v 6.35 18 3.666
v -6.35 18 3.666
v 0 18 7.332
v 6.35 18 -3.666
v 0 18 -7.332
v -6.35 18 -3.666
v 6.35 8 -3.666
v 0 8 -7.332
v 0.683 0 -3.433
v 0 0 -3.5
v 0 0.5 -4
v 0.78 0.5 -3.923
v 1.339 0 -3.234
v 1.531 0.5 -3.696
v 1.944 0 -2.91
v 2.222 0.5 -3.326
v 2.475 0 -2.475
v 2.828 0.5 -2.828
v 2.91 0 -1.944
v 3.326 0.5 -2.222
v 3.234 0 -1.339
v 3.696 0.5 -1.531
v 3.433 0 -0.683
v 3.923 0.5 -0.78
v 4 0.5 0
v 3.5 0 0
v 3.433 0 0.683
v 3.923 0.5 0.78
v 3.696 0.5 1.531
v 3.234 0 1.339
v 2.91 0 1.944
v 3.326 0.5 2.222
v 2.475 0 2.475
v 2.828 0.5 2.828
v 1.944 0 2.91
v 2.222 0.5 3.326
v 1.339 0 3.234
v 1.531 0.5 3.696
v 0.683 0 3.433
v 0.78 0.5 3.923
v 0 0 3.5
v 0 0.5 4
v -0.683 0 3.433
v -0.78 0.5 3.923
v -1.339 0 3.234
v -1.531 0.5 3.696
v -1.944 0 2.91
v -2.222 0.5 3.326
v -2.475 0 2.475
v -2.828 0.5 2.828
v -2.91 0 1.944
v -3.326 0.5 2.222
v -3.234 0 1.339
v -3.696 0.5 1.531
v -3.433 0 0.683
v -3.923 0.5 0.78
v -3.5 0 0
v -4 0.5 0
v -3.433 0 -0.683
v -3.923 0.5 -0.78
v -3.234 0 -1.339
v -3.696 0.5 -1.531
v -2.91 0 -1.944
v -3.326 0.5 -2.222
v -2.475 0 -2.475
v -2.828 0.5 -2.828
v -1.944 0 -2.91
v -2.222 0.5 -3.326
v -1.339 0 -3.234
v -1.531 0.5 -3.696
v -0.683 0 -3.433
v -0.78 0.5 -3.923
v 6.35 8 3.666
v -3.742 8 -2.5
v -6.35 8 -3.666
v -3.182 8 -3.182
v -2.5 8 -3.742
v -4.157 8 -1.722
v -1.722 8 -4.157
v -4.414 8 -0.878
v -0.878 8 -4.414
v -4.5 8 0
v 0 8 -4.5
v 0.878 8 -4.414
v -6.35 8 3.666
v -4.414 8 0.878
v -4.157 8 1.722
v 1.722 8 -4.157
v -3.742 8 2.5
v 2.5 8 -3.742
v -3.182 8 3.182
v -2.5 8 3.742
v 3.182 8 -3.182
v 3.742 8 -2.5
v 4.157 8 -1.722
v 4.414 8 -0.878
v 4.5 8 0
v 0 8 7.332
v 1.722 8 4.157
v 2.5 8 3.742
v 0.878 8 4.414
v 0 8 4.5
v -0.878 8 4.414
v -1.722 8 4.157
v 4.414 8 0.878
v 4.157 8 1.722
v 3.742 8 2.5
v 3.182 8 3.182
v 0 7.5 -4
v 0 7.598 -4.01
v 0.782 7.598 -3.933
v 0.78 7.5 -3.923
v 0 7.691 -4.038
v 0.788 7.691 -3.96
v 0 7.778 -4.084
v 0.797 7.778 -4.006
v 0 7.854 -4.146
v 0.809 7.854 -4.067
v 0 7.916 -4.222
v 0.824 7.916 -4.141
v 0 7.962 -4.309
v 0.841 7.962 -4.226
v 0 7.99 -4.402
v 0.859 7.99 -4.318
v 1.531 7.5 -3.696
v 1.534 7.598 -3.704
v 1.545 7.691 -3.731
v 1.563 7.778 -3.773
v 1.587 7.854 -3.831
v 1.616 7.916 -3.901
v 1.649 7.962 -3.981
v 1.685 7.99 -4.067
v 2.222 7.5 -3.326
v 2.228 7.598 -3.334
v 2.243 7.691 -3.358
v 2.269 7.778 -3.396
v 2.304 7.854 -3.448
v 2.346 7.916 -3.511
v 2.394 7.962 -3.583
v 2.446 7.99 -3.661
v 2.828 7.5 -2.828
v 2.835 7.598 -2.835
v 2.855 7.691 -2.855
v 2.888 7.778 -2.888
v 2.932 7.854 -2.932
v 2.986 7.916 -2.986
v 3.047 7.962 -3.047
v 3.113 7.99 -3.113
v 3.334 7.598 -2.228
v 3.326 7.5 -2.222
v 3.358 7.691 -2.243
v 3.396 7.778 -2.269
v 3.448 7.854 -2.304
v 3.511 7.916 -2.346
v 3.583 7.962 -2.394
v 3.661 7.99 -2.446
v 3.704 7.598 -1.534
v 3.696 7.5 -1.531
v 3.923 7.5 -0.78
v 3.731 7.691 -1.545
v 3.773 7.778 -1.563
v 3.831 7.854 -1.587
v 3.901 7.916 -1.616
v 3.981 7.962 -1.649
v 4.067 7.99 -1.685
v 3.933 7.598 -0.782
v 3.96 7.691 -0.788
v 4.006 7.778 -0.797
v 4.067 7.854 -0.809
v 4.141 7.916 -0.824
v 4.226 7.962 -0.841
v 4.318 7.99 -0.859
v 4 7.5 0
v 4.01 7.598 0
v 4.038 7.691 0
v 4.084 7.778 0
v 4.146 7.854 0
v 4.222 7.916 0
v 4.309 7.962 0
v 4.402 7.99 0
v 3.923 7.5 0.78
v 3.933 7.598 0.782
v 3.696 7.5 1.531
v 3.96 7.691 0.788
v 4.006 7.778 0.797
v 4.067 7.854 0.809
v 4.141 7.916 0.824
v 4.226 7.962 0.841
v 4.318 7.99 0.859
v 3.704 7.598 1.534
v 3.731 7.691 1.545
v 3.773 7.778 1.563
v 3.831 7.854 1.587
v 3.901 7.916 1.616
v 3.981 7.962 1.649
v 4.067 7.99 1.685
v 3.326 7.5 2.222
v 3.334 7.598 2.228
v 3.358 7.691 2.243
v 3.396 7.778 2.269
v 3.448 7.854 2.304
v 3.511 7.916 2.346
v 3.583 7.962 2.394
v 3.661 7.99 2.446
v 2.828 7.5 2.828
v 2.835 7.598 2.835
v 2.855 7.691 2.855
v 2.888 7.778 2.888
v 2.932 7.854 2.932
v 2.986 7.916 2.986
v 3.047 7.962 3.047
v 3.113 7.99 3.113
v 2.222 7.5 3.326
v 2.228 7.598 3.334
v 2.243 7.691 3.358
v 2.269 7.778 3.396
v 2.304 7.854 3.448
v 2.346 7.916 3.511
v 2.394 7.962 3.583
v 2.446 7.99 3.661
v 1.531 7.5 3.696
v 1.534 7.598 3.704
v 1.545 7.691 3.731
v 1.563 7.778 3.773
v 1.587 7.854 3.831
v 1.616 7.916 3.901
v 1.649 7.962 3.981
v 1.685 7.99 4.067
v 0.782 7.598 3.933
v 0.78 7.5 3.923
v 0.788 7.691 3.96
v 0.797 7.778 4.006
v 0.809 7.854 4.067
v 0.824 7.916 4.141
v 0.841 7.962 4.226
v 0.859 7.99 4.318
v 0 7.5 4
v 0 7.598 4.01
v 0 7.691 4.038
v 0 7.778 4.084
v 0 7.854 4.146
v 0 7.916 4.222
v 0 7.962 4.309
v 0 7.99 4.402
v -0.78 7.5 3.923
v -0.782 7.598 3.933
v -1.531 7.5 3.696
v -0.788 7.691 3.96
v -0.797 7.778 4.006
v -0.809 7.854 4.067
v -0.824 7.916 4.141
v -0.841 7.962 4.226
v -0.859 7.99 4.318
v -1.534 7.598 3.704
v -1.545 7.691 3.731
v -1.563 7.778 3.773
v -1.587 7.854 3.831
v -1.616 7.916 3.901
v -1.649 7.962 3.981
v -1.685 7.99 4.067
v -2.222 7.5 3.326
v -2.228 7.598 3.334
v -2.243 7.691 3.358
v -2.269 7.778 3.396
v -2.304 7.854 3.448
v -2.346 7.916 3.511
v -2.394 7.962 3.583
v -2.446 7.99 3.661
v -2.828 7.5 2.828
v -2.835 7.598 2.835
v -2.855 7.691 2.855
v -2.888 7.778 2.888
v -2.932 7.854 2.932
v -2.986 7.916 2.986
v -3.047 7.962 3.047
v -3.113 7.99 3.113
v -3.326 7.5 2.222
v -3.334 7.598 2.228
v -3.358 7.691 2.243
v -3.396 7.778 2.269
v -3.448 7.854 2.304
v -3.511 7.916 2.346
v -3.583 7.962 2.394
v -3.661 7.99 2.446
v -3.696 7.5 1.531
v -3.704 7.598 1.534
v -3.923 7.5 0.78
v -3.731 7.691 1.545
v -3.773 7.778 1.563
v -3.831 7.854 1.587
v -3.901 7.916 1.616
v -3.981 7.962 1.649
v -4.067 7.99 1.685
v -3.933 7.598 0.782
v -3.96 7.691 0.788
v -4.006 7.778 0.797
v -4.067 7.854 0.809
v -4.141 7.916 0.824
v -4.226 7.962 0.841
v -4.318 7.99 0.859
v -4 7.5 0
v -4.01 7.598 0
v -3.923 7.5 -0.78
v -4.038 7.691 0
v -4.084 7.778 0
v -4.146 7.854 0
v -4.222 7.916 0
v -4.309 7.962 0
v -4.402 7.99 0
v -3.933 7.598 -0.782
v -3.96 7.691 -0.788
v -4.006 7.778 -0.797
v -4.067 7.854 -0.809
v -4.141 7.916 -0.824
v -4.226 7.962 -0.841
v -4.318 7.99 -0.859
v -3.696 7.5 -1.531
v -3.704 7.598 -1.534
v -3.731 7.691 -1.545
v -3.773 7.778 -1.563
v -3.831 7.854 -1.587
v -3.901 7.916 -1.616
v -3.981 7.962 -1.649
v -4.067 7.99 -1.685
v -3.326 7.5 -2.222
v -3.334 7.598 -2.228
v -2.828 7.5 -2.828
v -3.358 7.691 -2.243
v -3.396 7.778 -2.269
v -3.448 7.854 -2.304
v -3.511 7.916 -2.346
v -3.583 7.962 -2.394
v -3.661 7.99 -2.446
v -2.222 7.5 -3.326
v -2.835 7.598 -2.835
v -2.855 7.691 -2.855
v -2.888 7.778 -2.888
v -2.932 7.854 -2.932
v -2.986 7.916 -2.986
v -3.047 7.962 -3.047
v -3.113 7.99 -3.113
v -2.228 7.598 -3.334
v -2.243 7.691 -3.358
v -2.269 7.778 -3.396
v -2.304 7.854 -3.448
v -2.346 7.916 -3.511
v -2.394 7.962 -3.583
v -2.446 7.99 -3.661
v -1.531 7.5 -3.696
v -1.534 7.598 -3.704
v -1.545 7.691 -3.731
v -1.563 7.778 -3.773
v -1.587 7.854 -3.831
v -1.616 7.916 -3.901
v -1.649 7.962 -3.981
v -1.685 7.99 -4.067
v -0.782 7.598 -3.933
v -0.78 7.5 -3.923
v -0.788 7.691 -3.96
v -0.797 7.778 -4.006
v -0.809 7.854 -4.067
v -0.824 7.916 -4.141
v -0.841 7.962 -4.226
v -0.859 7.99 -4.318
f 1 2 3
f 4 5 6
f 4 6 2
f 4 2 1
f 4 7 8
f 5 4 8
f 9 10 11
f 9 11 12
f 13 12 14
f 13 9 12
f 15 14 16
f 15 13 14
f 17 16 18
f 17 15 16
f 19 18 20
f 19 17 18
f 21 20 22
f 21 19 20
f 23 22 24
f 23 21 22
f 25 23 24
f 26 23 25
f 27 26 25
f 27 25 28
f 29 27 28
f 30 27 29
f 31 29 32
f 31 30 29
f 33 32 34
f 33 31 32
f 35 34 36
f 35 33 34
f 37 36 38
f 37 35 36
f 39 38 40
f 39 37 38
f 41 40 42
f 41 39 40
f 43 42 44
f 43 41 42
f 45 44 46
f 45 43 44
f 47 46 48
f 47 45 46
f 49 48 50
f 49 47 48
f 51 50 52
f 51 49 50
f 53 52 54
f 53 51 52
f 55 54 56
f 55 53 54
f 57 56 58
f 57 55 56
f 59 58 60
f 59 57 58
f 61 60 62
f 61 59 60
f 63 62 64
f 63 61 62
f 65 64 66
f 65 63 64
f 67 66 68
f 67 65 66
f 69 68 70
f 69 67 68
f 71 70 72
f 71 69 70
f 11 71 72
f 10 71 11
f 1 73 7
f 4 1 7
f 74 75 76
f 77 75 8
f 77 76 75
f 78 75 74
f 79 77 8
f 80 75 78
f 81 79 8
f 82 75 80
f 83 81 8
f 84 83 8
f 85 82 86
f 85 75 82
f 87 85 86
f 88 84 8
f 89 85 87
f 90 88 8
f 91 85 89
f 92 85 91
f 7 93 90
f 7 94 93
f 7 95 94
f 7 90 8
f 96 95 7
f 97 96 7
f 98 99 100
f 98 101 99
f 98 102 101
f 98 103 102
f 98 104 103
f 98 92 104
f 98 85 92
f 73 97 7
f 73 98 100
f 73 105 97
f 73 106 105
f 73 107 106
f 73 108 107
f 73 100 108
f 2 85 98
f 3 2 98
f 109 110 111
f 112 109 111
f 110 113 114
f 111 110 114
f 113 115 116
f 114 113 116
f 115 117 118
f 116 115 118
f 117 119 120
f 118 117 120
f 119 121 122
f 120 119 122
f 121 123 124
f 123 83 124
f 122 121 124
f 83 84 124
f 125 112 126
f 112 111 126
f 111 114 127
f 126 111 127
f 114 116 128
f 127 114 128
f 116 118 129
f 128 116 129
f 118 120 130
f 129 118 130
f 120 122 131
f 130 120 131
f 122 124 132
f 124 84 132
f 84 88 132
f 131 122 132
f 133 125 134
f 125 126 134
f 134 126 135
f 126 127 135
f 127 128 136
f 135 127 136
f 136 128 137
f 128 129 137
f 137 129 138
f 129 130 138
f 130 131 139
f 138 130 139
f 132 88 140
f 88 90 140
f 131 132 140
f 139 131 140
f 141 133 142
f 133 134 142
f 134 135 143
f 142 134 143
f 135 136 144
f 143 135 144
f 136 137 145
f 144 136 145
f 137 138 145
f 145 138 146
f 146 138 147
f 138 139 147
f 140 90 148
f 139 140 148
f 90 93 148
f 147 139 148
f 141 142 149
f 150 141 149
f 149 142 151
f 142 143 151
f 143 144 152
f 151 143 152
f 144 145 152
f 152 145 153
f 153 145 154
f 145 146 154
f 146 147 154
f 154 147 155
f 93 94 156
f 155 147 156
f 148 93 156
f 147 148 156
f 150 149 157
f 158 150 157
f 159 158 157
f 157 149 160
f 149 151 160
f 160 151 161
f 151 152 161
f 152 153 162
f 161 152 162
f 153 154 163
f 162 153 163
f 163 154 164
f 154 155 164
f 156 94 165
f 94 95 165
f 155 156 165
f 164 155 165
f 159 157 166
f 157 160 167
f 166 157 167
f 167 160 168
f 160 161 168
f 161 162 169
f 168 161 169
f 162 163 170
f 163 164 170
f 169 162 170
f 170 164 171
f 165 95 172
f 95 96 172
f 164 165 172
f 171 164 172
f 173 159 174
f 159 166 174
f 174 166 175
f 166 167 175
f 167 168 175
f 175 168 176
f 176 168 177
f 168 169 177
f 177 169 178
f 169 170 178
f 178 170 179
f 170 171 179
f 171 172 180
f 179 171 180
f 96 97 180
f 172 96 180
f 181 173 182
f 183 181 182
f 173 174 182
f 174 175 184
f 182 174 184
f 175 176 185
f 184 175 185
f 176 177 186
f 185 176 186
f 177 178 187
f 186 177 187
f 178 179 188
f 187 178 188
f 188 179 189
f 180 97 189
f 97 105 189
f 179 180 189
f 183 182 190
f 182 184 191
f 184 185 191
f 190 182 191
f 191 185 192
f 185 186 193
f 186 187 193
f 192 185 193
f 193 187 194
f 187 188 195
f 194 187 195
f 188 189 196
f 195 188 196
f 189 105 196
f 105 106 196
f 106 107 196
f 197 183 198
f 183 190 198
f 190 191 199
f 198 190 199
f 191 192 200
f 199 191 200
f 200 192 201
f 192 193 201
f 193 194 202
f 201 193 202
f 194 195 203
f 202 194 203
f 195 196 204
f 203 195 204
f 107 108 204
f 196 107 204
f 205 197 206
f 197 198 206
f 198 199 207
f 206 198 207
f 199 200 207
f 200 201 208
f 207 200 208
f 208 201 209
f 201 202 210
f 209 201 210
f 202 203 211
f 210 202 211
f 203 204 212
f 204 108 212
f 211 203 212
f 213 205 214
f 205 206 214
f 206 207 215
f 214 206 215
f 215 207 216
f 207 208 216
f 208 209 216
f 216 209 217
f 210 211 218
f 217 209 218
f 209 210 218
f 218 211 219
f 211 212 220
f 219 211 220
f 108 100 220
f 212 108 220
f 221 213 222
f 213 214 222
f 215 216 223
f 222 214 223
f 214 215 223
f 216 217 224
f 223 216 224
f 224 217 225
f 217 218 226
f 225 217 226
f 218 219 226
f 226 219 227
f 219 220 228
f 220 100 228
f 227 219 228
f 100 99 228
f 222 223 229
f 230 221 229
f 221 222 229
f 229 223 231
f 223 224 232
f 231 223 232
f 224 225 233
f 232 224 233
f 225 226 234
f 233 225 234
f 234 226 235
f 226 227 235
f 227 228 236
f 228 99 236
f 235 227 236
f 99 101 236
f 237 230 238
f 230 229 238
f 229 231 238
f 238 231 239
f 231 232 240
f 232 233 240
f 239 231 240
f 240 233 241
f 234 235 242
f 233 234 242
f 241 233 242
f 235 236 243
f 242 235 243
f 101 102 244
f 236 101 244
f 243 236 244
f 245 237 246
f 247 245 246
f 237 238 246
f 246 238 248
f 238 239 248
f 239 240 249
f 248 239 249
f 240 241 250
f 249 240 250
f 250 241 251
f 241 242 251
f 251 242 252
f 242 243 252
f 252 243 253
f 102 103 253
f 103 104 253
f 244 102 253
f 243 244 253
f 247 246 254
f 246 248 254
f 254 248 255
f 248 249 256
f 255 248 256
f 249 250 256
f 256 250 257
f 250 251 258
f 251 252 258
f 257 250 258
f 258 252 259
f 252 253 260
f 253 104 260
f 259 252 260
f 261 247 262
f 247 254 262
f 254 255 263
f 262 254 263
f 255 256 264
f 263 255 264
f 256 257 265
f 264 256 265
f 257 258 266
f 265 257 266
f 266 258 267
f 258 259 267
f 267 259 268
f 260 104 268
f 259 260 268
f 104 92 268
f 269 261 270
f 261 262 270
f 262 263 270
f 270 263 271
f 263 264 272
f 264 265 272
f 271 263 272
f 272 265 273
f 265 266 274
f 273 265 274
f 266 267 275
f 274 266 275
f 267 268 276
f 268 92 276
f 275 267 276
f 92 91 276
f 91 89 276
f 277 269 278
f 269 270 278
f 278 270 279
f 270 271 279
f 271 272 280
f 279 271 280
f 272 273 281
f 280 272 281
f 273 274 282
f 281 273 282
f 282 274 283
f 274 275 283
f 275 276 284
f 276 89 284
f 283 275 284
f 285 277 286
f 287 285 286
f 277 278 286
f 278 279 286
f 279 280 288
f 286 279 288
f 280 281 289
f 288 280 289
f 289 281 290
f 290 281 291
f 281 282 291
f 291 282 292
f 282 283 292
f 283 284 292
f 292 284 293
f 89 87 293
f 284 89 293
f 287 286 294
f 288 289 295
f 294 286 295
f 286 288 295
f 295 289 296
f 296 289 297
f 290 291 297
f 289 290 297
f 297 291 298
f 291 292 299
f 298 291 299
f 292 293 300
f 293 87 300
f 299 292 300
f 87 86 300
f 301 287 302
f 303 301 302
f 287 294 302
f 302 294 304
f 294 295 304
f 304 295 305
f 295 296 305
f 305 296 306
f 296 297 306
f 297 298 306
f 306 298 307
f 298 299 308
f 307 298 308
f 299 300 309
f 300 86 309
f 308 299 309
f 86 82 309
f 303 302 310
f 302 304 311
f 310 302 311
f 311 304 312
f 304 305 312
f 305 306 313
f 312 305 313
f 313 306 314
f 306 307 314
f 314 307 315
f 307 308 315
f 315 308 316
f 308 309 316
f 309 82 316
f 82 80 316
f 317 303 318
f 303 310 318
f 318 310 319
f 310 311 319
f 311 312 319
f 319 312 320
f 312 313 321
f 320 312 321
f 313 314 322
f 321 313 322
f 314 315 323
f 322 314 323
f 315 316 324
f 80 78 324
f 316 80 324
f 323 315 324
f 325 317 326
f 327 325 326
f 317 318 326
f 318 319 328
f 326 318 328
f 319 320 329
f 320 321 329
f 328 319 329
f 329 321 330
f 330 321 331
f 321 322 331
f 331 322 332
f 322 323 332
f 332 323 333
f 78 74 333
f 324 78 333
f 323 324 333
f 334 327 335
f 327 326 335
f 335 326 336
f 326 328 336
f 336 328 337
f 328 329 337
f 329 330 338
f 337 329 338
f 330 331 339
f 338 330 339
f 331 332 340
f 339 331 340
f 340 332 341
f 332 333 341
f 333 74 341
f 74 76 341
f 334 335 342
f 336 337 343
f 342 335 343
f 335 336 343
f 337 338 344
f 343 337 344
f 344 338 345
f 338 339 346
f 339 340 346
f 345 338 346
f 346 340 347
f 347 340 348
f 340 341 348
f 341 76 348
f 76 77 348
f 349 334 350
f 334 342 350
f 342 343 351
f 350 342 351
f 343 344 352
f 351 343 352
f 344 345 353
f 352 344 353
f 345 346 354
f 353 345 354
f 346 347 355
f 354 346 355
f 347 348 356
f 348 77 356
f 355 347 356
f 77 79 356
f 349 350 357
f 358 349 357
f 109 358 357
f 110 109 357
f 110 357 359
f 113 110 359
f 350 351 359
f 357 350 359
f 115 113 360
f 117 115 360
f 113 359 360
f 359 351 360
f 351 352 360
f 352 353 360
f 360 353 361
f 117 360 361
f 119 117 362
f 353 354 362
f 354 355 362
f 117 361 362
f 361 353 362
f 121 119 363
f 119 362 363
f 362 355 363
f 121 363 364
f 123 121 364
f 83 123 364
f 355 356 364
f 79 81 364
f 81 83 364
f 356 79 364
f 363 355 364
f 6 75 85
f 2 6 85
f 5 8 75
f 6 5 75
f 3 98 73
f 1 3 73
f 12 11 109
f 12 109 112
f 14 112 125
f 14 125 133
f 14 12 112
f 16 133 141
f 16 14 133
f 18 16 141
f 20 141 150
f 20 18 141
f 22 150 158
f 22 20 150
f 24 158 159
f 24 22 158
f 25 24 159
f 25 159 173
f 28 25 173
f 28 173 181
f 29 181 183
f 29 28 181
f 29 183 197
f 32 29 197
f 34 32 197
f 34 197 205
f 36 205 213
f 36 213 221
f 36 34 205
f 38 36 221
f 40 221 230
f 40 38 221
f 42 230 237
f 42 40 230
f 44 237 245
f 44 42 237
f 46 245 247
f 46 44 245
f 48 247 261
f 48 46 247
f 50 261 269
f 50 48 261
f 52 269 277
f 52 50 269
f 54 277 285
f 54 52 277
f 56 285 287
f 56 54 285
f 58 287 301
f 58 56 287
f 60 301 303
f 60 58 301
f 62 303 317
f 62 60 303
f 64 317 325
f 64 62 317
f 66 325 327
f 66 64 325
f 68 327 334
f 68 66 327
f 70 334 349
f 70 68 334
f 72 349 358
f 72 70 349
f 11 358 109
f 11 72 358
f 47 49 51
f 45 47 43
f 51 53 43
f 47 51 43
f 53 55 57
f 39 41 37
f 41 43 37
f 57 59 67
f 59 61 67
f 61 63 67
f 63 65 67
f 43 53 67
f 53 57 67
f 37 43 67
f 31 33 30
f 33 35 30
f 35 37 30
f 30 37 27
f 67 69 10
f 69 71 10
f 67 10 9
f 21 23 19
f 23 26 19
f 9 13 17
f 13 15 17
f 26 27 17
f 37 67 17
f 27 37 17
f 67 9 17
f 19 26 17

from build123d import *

# Parameters (mm, degrees)
BOSS_EXTRUDE1_DEPTH = 18
SKETCH2_R           = 11.041955005
SKETCH2_R_2         = 4
CUT_EXTRUDE1_DEPTH  = 8
CHAMFER1_SIZE       = 0.5
FILLET1_R           = 0.5


with BuildPart() as part:
    # Sketch1 → Boss-Extrude1 (new body)
    with BuildSketch(Plane(origin=(0, 0, 0), x_dir=(1, 0, 0), z_dir=(0, 1, 0))):
        Polygon((6.35, 3.666174209), (0, 7.332348419), (-6.35, 3.666174209), (-6.35, -3.666174209), (0, -7.332348419), (6.35, -3.666174209), align=None)
    extrude(amount=BOSS_EXTRUDE1_DEPTH)

    # Sketch2 → Cut-Extrude1 (cut)
    with BuildSketch(Plane.XZ):
        Circle(SKETCH2_R)
        with Locations(Location((0, 0, 0), (0, 0, 270))):
            Circle(SKETCH2_R_2, mode=Mode.SUBTRACT)
    extrude(amount=-CUT_EXTRUDE1_DEPTH, mode=Mode.SUBTRACT)

    # Chamfer1
    chamfer1_edges = [part.edges().sort_by_distance(p)[0] for p in [
        (0, 0, 4),
    ]]
    chamfer(chamfer1_edges, length=CHAMFER1_SIZE)

    # Fillet1
    fillet1_edges = [part.edges().sort_by_distance(p)[0] for p in [
        (0, 8, 4),
    ]]
    fillet(fillet1_edges, radius=FILLET1_R)


solid = part.part
